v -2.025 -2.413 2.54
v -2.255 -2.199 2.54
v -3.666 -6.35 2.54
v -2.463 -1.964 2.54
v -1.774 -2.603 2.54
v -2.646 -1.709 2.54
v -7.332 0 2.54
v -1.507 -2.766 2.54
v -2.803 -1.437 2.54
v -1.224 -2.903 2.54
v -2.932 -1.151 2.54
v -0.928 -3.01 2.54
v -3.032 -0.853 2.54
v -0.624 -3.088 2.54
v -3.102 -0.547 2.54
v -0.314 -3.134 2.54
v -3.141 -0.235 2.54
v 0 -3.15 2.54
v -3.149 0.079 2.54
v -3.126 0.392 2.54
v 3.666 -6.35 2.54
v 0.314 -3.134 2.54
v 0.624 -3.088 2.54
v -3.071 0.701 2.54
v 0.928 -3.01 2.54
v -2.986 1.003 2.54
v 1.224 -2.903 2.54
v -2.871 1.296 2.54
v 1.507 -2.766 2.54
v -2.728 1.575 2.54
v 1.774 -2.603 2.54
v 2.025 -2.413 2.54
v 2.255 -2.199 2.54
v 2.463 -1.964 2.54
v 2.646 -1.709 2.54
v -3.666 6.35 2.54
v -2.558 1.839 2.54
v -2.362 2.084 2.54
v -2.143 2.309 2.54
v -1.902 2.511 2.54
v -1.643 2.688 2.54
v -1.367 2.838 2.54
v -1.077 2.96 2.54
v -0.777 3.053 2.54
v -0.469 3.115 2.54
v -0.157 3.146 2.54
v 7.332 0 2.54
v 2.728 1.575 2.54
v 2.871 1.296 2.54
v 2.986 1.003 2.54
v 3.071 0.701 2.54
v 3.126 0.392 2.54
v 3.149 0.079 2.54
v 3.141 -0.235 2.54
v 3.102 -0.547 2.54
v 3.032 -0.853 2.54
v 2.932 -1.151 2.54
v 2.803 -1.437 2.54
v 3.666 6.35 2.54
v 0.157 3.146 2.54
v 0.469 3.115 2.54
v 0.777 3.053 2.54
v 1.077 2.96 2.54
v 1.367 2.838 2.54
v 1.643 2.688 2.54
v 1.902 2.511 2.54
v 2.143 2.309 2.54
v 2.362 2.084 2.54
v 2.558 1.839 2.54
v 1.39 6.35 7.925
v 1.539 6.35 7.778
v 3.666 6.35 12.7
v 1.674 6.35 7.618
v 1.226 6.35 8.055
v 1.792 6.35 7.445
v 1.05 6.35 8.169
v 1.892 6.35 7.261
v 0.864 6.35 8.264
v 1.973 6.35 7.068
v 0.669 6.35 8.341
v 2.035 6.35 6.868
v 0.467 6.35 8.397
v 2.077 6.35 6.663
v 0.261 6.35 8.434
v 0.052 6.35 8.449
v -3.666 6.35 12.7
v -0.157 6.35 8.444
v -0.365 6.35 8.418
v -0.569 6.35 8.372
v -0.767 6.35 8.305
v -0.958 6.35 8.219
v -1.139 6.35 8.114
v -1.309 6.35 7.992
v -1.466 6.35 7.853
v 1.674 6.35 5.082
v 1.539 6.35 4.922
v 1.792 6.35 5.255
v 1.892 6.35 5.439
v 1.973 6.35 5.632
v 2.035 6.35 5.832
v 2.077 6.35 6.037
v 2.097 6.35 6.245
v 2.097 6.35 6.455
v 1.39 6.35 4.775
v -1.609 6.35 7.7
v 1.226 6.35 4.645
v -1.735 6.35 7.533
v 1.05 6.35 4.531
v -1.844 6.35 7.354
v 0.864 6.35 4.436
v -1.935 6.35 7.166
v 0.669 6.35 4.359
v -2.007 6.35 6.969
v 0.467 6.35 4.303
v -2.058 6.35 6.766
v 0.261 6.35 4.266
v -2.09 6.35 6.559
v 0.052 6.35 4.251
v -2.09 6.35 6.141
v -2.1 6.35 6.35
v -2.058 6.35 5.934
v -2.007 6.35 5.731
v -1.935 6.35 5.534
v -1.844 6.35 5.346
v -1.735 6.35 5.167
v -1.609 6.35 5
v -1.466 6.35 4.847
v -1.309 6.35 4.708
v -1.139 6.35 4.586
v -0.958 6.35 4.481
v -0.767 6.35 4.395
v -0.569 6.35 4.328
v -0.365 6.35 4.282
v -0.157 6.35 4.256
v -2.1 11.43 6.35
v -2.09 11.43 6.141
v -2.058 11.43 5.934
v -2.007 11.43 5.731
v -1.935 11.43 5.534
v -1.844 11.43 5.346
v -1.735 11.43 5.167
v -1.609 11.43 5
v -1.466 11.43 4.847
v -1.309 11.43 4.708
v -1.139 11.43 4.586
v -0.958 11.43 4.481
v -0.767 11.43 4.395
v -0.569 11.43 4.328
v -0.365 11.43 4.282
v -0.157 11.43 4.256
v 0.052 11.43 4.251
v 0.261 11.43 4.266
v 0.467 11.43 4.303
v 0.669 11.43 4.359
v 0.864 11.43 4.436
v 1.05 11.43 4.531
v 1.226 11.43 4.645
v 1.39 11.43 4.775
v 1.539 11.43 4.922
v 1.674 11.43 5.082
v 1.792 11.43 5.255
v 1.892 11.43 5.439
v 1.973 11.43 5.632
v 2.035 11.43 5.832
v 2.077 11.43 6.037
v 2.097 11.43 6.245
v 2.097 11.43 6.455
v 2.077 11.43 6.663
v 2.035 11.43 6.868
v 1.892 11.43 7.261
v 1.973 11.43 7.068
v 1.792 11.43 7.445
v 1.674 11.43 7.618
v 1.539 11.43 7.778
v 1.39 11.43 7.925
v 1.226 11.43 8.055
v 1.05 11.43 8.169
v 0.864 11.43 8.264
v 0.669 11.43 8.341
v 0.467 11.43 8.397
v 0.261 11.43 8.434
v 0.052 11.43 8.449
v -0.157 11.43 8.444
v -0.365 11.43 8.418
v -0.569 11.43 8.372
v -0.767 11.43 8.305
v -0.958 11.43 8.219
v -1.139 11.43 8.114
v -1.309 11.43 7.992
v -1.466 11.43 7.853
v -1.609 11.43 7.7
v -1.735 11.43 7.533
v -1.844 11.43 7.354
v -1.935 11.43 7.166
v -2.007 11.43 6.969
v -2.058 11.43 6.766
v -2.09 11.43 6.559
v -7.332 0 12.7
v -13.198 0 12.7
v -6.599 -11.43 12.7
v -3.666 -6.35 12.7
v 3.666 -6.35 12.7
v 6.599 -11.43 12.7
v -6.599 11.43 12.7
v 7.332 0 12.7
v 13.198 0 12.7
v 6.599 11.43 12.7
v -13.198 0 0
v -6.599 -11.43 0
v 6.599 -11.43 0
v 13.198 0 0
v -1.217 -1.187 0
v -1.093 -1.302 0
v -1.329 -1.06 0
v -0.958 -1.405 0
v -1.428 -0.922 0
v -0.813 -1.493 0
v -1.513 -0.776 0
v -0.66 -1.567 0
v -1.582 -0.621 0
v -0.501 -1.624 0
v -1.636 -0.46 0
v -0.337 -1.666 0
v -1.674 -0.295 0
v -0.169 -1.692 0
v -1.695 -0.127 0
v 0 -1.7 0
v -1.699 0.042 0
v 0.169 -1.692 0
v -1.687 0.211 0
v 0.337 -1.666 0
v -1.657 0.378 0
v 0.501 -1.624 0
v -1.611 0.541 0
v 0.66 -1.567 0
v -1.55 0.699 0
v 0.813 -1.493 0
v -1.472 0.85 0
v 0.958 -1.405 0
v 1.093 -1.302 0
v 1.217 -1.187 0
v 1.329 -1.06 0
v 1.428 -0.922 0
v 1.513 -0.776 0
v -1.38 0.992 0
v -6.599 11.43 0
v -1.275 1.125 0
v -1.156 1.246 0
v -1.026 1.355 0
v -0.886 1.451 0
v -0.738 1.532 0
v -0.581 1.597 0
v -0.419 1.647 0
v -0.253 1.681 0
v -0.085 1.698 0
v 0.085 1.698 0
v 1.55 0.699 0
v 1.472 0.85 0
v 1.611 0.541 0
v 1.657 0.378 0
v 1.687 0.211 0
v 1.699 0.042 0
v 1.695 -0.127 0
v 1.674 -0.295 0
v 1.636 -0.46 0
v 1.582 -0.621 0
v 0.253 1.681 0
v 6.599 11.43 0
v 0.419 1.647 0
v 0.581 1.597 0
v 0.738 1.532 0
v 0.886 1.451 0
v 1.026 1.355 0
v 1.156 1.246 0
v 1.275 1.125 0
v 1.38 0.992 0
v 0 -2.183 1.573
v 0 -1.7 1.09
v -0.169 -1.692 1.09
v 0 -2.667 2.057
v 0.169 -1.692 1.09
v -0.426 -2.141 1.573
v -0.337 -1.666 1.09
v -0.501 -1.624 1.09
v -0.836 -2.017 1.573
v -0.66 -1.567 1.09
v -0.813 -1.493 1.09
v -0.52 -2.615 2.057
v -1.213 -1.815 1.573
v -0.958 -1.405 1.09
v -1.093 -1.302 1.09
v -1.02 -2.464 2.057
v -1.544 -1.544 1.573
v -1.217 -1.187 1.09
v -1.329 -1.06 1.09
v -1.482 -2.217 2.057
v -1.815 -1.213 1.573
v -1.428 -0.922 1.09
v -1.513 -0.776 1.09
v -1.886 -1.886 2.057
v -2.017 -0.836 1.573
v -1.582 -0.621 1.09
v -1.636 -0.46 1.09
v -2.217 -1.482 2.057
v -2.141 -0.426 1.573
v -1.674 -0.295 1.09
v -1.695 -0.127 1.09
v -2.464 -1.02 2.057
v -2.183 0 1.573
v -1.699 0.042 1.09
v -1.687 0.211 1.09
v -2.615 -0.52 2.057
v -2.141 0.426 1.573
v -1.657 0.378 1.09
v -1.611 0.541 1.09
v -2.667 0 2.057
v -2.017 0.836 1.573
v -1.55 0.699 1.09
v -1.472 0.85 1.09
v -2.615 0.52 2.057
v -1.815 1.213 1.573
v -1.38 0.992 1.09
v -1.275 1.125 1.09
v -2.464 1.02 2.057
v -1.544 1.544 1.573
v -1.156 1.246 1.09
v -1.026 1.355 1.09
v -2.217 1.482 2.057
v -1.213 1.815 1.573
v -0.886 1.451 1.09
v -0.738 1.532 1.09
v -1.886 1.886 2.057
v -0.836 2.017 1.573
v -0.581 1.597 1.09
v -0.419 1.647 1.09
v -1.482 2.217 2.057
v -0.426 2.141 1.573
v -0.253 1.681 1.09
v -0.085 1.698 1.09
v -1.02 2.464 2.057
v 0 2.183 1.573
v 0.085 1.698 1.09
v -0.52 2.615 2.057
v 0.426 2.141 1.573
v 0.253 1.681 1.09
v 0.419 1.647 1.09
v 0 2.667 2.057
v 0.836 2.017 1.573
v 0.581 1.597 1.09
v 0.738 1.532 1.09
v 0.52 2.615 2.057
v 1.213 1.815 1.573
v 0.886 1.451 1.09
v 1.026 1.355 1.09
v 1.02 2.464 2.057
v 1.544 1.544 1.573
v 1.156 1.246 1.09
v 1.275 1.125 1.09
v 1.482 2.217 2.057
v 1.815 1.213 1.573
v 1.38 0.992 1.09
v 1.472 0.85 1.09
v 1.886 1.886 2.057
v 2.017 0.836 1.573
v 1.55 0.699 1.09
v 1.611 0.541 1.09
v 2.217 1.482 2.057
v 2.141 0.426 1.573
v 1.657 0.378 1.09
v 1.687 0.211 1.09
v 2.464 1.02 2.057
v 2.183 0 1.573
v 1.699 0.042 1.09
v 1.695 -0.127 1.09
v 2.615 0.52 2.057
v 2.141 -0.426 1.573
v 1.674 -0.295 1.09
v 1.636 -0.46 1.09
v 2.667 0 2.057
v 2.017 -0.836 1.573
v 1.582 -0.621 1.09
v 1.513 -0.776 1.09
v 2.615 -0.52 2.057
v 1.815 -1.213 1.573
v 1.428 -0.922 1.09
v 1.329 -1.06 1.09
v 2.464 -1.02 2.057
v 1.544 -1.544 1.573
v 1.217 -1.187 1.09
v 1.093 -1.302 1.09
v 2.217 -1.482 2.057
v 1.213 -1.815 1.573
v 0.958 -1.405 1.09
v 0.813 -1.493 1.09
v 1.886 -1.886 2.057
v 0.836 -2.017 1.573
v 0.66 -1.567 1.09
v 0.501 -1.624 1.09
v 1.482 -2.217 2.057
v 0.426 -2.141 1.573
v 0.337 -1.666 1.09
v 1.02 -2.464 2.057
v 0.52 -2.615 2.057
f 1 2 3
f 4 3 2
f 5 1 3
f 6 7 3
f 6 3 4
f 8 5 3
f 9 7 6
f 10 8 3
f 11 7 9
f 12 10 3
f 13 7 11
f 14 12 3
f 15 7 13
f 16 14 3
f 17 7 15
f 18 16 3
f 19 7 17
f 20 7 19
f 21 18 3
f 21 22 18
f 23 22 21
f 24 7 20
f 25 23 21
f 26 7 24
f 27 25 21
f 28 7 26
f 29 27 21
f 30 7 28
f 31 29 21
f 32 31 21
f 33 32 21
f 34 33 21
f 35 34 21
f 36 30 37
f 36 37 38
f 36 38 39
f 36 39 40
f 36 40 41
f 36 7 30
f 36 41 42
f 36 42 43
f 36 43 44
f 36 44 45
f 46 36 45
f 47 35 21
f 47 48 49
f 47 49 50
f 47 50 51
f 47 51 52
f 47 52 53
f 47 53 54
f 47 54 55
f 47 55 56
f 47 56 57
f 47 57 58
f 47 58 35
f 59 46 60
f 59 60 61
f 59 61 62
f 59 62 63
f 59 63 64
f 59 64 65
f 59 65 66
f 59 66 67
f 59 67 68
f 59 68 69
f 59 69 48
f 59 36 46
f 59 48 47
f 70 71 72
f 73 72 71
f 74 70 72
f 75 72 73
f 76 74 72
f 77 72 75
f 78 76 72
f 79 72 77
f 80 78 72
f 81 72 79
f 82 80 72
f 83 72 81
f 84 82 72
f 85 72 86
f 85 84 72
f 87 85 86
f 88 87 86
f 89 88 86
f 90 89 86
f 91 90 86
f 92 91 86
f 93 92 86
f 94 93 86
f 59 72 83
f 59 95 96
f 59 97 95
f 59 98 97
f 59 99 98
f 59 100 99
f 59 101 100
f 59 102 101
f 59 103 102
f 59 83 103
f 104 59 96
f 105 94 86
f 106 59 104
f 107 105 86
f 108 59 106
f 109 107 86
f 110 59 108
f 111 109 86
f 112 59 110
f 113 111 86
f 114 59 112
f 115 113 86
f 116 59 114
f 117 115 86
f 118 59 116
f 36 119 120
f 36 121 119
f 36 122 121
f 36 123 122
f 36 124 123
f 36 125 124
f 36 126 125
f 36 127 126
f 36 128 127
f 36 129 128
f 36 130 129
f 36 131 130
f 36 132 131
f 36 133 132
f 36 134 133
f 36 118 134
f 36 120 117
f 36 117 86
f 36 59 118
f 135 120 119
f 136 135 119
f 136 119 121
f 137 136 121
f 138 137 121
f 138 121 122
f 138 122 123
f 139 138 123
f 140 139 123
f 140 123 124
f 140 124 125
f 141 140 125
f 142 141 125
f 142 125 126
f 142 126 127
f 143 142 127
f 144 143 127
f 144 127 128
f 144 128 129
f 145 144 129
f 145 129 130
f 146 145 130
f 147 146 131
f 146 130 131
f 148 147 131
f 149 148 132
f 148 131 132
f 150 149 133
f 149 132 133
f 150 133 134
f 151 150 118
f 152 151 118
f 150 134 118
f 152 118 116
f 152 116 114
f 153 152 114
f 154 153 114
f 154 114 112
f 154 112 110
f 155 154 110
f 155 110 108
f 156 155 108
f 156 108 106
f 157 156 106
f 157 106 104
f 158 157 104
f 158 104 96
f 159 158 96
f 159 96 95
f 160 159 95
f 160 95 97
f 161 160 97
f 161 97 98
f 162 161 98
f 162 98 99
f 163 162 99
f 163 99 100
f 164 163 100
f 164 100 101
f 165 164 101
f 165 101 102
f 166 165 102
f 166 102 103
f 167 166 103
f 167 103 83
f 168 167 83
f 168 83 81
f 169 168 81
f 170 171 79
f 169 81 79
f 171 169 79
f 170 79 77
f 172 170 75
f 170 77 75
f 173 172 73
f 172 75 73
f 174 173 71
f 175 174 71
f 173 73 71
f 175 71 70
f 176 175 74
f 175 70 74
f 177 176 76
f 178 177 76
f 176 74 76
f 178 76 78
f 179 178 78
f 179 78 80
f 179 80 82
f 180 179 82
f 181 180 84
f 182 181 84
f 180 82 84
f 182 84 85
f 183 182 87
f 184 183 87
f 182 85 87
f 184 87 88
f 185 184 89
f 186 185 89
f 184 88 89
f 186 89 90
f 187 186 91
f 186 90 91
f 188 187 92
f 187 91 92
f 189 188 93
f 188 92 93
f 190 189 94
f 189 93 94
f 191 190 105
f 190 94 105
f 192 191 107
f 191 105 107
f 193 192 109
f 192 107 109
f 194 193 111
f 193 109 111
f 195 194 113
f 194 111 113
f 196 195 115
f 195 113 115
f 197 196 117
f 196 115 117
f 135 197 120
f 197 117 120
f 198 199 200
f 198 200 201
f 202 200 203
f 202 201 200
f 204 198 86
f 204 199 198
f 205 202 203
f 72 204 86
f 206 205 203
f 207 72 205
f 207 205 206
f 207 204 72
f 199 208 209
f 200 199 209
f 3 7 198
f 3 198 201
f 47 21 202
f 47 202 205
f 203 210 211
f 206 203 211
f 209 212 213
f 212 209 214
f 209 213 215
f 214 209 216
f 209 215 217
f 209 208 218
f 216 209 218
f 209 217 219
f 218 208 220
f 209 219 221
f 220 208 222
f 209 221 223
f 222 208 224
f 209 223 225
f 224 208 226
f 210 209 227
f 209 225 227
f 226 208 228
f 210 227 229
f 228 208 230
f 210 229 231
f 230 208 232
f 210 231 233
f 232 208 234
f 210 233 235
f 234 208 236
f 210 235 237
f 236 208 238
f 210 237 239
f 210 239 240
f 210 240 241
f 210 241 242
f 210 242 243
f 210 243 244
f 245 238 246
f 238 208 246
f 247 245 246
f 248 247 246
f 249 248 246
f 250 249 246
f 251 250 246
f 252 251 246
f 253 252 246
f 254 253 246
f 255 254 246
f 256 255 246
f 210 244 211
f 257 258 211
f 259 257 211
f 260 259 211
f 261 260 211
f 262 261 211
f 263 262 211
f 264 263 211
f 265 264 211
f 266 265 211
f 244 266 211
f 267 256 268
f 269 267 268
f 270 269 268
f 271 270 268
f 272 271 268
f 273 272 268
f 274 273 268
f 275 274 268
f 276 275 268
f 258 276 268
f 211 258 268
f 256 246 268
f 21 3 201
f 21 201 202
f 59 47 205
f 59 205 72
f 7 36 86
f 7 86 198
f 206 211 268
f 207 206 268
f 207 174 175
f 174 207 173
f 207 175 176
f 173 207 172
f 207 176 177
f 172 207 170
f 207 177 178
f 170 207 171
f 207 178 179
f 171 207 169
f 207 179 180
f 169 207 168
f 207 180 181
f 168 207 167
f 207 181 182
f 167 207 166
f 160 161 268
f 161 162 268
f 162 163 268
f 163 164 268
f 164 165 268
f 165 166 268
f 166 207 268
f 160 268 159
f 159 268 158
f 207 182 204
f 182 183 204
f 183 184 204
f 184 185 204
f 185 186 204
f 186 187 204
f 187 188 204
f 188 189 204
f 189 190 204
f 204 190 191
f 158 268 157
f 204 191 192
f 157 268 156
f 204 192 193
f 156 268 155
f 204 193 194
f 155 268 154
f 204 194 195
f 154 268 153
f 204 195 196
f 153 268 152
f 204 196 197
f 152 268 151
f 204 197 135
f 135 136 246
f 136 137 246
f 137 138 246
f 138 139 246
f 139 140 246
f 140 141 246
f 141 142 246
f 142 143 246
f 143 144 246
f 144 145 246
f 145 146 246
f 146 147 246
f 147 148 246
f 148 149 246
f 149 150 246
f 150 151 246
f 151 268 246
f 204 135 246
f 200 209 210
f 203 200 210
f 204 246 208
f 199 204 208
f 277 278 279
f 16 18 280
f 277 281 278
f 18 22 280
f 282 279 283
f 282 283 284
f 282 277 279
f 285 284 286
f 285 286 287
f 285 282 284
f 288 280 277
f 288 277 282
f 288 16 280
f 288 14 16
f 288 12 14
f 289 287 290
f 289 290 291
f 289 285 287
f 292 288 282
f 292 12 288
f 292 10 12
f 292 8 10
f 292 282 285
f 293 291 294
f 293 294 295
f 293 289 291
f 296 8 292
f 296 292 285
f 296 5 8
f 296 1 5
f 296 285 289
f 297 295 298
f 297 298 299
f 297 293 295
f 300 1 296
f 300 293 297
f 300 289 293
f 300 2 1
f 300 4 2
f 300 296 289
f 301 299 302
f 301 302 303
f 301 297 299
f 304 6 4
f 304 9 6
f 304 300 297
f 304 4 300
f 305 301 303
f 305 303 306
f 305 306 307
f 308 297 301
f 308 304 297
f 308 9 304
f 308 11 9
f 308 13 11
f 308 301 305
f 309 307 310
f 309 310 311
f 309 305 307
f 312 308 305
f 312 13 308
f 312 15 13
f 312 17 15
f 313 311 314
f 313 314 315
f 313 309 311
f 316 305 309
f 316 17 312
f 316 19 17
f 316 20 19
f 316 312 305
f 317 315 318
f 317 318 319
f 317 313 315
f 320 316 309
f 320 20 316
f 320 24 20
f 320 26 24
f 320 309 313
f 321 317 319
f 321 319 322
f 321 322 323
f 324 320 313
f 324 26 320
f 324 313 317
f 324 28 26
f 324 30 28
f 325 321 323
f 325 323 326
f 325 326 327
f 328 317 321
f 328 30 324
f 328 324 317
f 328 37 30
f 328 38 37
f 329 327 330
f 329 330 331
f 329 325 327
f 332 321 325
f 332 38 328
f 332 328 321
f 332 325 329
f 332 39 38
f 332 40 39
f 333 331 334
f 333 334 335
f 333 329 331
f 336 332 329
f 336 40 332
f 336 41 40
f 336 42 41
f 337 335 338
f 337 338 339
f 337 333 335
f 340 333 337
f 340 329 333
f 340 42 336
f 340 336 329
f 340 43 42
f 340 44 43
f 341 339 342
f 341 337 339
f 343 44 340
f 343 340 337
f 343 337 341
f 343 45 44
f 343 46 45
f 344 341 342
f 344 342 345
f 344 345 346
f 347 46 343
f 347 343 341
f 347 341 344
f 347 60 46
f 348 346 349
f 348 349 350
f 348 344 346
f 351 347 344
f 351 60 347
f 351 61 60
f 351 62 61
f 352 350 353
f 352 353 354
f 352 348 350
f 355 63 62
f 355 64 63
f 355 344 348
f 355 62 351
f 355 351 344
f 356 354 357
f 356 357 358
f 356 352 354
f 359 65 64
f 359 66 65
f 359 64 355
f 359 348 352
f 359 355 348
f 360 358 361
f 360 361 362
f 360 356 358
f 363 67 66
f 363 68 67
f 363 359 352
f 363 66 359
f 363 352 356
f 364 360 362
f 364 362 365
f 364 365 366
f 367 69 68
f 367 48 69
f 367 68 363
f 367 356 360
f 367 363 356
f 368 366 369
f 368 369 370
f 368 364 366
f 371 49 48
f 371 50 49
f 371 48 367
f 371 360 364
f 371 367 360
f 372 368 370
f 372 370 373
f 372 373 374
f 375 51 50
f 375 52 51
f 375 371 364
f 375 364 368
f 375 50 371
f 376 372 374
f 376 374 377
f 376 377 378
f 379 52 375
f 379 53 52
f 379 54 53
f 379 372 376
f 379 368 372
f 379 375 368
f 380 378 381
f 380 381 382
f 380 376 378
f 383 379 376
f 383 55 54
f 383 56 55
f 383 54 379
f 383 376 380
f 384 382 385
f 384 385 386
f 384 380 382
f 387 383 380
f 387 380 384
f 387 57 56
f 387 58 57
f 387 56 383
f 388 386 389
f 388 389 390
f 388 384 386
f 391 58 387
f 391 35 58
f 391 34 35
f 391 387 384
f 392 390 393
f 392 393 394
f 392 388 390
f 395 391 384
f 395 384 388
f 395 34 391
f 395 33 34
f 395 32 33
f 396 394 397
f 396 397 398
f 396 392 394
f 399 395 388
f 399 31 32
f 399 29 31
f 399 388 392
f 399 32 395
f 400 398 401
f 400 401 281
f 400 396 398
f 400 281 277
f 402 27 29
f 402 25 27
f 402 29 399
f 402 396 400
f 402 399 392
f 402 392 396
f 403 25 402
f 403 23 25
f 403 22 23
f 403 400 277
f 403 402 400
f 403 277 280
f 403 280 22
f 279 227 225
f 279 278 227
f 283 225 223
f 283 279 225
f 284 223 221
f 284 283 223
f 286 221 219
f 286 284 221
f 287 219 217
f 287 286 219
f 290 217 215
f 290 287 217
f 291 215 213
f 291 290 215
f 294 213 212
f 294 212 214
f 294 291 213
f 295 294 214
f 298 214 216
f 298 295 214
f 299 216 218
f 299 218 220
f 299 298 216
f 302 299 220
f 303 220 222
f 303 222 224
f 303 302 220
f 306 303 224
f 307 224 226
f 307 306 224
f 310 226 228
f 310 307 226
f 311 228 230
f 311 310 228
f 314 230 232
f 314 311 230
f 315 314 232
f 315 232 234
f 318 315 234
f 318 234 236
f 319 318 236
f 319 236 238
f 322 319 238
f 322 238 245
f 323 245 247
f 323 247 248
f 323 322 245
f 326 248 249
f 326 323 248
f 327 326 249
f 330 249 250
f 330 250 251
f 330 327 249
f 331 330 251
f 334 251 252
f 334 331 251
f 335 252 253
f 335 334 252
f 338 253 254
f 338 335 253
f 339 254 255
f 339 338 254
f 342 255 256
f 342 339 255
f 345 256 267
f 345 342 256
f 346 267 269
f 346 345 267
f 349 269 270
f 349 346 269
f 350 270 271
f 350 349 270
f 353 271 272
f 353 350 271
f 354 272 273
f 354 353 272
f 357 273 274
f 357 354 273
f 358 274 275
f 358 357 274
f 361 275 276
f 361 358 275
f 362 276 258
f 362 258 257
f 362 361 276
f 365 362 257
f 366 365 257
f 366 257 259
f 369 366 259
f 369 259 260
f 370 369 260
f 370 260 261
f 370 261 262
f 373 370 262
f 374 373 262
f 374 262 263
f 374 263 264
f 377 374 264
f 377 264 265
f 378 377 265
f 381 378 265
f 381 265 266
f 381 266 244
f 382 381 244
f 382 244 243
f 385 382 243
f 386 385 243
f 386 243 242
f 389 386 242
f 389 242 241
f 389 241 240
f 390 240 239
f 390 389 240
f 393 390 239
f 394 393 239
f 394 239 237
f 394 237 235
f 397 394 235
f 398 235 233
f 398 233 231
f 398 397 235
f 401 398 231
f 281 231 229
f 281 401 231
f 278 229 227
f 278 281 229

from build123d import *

# Parameters (mm, degrees)
BOSS_EXTRUDE1_DEPTH                            = 2.54
CSK_FOR_M3_FLAT_HEAD_MACHINE_SCREW1_AT_2_COUNT = 2
CSK_FOR_M3_FLAT_HEAD_MACHINE_SCREW1_AT_2_PITCH = 18.548356757
BOSS_EXTRUDE2_DEPTH                            = 12.7
M5X0_8_TAPPED_HOLE1_D                          = 4.2
M5X0_8_TAPPED_HOLE1_DEPTH                      = 5.08


with BuildPart() as part:
    # Sketch1 → Boss-Extrude1 (new body)
    # profile 1 of 2: a face of its own
    with BuildSketch(Plane.XY):
        Polygon((6.599113577, -11.43), (13.198227154, 0), (6.599113577, 11.43), (-6.599113577, 11.43), (-13.198227154, 0), (-6.599113577, -11.43), align=None)
        Polygon((-3.666174209, -6.35), (3.666174209, -6.35), (7.332348419, 0), (3.666174209, 6.35), (-3.666174209, 6.35), (-7.332348419, 0), align=None, mode=Mode.SUBTRACT)
    # profile 2 of 2: a face of its own
    with BuildSketch(Plane.XY):
        Polygon((-7.332348419, 0), (-3.666174209, -6.35), (3.666174209, -6.35), (7.332348419, 0), (3.666174209, 6.35), (-3.666174209, 6.35), align=None)
    extrude(amount=BOSS_EXTRUDE1_DEPTH)

    # Sketch3 → CSK for M3 Flat Head Machine Screw1 (revolve, cut)
    with BuildSketch(Plane(origin=(0, 0, 2.54), x_dir=(0, -1, 0), z_dir=(1, 0, 0))):
        Polygon((0, 0), (0, 2.54), (1.7, 2.54), (1.7, 1.45), (3.15, 0), align=None)
    csk_for_m3_flat_head_machine_screw1 = revolve(axis=Axis((0, 0, 8.89), (0, 0, -1)), mode=Mode.SUBTRACT)

    # CSK for M3 Flat Head Machine Screw1 at 2: CSK for M3 Flat Head Machine Screw1 ×2
    with Locations(*[Vector(-0.9274068813992224, 0.37405410883101997, 0) * (i * CSK_FOR_M3_FLAT_HEAD_MACHINE_SCREW1_AT_2_PITCH) for i in range(1, CSK_FOR_M3_FLAT_HEAD_MACHINE_SCREW1_AT_2_COUNT)]):
        add(csk_for_m3_flat_head_machine_screw1, mode=Mode.SUBTRACT)

    # Sketch1<4> → Boss-Extrude2 (add)
    with BuildSketch(Plane.XY):
        Polygon((6.599113577, 11.43), (-6.599113577, 11.43), (-13.198227154, 0), (-6.599113577, -11.43), (6.599113577, -11.43), (13.198227154, 0), align=None)
        Polygon((3.666174209, -6.35), (7.332348419, 0), (3.666174209, 6.35), (-3.666174209, 6.35), (-7.332348419, 0), (-3.666174209, -6.35), align=None, mode=Mode.SUBTRACT)
    extrude(amount=BOSS_EXTRUDE2_DEPTH)

    # M5x0.8 Tapped Hole1
    with Locations(Plane(origin=(0, 11.43, 0), x_dir=(1, 0, 0), z_dir=(0, 1, 0))):
        with Locations((0, -6.35)):
            Hole(M5X0_8_TAPPED_HOLE1_D / 2, depth=M5X0_8_TAPPED_HOLE1_DEPTH)


solid = part.part
